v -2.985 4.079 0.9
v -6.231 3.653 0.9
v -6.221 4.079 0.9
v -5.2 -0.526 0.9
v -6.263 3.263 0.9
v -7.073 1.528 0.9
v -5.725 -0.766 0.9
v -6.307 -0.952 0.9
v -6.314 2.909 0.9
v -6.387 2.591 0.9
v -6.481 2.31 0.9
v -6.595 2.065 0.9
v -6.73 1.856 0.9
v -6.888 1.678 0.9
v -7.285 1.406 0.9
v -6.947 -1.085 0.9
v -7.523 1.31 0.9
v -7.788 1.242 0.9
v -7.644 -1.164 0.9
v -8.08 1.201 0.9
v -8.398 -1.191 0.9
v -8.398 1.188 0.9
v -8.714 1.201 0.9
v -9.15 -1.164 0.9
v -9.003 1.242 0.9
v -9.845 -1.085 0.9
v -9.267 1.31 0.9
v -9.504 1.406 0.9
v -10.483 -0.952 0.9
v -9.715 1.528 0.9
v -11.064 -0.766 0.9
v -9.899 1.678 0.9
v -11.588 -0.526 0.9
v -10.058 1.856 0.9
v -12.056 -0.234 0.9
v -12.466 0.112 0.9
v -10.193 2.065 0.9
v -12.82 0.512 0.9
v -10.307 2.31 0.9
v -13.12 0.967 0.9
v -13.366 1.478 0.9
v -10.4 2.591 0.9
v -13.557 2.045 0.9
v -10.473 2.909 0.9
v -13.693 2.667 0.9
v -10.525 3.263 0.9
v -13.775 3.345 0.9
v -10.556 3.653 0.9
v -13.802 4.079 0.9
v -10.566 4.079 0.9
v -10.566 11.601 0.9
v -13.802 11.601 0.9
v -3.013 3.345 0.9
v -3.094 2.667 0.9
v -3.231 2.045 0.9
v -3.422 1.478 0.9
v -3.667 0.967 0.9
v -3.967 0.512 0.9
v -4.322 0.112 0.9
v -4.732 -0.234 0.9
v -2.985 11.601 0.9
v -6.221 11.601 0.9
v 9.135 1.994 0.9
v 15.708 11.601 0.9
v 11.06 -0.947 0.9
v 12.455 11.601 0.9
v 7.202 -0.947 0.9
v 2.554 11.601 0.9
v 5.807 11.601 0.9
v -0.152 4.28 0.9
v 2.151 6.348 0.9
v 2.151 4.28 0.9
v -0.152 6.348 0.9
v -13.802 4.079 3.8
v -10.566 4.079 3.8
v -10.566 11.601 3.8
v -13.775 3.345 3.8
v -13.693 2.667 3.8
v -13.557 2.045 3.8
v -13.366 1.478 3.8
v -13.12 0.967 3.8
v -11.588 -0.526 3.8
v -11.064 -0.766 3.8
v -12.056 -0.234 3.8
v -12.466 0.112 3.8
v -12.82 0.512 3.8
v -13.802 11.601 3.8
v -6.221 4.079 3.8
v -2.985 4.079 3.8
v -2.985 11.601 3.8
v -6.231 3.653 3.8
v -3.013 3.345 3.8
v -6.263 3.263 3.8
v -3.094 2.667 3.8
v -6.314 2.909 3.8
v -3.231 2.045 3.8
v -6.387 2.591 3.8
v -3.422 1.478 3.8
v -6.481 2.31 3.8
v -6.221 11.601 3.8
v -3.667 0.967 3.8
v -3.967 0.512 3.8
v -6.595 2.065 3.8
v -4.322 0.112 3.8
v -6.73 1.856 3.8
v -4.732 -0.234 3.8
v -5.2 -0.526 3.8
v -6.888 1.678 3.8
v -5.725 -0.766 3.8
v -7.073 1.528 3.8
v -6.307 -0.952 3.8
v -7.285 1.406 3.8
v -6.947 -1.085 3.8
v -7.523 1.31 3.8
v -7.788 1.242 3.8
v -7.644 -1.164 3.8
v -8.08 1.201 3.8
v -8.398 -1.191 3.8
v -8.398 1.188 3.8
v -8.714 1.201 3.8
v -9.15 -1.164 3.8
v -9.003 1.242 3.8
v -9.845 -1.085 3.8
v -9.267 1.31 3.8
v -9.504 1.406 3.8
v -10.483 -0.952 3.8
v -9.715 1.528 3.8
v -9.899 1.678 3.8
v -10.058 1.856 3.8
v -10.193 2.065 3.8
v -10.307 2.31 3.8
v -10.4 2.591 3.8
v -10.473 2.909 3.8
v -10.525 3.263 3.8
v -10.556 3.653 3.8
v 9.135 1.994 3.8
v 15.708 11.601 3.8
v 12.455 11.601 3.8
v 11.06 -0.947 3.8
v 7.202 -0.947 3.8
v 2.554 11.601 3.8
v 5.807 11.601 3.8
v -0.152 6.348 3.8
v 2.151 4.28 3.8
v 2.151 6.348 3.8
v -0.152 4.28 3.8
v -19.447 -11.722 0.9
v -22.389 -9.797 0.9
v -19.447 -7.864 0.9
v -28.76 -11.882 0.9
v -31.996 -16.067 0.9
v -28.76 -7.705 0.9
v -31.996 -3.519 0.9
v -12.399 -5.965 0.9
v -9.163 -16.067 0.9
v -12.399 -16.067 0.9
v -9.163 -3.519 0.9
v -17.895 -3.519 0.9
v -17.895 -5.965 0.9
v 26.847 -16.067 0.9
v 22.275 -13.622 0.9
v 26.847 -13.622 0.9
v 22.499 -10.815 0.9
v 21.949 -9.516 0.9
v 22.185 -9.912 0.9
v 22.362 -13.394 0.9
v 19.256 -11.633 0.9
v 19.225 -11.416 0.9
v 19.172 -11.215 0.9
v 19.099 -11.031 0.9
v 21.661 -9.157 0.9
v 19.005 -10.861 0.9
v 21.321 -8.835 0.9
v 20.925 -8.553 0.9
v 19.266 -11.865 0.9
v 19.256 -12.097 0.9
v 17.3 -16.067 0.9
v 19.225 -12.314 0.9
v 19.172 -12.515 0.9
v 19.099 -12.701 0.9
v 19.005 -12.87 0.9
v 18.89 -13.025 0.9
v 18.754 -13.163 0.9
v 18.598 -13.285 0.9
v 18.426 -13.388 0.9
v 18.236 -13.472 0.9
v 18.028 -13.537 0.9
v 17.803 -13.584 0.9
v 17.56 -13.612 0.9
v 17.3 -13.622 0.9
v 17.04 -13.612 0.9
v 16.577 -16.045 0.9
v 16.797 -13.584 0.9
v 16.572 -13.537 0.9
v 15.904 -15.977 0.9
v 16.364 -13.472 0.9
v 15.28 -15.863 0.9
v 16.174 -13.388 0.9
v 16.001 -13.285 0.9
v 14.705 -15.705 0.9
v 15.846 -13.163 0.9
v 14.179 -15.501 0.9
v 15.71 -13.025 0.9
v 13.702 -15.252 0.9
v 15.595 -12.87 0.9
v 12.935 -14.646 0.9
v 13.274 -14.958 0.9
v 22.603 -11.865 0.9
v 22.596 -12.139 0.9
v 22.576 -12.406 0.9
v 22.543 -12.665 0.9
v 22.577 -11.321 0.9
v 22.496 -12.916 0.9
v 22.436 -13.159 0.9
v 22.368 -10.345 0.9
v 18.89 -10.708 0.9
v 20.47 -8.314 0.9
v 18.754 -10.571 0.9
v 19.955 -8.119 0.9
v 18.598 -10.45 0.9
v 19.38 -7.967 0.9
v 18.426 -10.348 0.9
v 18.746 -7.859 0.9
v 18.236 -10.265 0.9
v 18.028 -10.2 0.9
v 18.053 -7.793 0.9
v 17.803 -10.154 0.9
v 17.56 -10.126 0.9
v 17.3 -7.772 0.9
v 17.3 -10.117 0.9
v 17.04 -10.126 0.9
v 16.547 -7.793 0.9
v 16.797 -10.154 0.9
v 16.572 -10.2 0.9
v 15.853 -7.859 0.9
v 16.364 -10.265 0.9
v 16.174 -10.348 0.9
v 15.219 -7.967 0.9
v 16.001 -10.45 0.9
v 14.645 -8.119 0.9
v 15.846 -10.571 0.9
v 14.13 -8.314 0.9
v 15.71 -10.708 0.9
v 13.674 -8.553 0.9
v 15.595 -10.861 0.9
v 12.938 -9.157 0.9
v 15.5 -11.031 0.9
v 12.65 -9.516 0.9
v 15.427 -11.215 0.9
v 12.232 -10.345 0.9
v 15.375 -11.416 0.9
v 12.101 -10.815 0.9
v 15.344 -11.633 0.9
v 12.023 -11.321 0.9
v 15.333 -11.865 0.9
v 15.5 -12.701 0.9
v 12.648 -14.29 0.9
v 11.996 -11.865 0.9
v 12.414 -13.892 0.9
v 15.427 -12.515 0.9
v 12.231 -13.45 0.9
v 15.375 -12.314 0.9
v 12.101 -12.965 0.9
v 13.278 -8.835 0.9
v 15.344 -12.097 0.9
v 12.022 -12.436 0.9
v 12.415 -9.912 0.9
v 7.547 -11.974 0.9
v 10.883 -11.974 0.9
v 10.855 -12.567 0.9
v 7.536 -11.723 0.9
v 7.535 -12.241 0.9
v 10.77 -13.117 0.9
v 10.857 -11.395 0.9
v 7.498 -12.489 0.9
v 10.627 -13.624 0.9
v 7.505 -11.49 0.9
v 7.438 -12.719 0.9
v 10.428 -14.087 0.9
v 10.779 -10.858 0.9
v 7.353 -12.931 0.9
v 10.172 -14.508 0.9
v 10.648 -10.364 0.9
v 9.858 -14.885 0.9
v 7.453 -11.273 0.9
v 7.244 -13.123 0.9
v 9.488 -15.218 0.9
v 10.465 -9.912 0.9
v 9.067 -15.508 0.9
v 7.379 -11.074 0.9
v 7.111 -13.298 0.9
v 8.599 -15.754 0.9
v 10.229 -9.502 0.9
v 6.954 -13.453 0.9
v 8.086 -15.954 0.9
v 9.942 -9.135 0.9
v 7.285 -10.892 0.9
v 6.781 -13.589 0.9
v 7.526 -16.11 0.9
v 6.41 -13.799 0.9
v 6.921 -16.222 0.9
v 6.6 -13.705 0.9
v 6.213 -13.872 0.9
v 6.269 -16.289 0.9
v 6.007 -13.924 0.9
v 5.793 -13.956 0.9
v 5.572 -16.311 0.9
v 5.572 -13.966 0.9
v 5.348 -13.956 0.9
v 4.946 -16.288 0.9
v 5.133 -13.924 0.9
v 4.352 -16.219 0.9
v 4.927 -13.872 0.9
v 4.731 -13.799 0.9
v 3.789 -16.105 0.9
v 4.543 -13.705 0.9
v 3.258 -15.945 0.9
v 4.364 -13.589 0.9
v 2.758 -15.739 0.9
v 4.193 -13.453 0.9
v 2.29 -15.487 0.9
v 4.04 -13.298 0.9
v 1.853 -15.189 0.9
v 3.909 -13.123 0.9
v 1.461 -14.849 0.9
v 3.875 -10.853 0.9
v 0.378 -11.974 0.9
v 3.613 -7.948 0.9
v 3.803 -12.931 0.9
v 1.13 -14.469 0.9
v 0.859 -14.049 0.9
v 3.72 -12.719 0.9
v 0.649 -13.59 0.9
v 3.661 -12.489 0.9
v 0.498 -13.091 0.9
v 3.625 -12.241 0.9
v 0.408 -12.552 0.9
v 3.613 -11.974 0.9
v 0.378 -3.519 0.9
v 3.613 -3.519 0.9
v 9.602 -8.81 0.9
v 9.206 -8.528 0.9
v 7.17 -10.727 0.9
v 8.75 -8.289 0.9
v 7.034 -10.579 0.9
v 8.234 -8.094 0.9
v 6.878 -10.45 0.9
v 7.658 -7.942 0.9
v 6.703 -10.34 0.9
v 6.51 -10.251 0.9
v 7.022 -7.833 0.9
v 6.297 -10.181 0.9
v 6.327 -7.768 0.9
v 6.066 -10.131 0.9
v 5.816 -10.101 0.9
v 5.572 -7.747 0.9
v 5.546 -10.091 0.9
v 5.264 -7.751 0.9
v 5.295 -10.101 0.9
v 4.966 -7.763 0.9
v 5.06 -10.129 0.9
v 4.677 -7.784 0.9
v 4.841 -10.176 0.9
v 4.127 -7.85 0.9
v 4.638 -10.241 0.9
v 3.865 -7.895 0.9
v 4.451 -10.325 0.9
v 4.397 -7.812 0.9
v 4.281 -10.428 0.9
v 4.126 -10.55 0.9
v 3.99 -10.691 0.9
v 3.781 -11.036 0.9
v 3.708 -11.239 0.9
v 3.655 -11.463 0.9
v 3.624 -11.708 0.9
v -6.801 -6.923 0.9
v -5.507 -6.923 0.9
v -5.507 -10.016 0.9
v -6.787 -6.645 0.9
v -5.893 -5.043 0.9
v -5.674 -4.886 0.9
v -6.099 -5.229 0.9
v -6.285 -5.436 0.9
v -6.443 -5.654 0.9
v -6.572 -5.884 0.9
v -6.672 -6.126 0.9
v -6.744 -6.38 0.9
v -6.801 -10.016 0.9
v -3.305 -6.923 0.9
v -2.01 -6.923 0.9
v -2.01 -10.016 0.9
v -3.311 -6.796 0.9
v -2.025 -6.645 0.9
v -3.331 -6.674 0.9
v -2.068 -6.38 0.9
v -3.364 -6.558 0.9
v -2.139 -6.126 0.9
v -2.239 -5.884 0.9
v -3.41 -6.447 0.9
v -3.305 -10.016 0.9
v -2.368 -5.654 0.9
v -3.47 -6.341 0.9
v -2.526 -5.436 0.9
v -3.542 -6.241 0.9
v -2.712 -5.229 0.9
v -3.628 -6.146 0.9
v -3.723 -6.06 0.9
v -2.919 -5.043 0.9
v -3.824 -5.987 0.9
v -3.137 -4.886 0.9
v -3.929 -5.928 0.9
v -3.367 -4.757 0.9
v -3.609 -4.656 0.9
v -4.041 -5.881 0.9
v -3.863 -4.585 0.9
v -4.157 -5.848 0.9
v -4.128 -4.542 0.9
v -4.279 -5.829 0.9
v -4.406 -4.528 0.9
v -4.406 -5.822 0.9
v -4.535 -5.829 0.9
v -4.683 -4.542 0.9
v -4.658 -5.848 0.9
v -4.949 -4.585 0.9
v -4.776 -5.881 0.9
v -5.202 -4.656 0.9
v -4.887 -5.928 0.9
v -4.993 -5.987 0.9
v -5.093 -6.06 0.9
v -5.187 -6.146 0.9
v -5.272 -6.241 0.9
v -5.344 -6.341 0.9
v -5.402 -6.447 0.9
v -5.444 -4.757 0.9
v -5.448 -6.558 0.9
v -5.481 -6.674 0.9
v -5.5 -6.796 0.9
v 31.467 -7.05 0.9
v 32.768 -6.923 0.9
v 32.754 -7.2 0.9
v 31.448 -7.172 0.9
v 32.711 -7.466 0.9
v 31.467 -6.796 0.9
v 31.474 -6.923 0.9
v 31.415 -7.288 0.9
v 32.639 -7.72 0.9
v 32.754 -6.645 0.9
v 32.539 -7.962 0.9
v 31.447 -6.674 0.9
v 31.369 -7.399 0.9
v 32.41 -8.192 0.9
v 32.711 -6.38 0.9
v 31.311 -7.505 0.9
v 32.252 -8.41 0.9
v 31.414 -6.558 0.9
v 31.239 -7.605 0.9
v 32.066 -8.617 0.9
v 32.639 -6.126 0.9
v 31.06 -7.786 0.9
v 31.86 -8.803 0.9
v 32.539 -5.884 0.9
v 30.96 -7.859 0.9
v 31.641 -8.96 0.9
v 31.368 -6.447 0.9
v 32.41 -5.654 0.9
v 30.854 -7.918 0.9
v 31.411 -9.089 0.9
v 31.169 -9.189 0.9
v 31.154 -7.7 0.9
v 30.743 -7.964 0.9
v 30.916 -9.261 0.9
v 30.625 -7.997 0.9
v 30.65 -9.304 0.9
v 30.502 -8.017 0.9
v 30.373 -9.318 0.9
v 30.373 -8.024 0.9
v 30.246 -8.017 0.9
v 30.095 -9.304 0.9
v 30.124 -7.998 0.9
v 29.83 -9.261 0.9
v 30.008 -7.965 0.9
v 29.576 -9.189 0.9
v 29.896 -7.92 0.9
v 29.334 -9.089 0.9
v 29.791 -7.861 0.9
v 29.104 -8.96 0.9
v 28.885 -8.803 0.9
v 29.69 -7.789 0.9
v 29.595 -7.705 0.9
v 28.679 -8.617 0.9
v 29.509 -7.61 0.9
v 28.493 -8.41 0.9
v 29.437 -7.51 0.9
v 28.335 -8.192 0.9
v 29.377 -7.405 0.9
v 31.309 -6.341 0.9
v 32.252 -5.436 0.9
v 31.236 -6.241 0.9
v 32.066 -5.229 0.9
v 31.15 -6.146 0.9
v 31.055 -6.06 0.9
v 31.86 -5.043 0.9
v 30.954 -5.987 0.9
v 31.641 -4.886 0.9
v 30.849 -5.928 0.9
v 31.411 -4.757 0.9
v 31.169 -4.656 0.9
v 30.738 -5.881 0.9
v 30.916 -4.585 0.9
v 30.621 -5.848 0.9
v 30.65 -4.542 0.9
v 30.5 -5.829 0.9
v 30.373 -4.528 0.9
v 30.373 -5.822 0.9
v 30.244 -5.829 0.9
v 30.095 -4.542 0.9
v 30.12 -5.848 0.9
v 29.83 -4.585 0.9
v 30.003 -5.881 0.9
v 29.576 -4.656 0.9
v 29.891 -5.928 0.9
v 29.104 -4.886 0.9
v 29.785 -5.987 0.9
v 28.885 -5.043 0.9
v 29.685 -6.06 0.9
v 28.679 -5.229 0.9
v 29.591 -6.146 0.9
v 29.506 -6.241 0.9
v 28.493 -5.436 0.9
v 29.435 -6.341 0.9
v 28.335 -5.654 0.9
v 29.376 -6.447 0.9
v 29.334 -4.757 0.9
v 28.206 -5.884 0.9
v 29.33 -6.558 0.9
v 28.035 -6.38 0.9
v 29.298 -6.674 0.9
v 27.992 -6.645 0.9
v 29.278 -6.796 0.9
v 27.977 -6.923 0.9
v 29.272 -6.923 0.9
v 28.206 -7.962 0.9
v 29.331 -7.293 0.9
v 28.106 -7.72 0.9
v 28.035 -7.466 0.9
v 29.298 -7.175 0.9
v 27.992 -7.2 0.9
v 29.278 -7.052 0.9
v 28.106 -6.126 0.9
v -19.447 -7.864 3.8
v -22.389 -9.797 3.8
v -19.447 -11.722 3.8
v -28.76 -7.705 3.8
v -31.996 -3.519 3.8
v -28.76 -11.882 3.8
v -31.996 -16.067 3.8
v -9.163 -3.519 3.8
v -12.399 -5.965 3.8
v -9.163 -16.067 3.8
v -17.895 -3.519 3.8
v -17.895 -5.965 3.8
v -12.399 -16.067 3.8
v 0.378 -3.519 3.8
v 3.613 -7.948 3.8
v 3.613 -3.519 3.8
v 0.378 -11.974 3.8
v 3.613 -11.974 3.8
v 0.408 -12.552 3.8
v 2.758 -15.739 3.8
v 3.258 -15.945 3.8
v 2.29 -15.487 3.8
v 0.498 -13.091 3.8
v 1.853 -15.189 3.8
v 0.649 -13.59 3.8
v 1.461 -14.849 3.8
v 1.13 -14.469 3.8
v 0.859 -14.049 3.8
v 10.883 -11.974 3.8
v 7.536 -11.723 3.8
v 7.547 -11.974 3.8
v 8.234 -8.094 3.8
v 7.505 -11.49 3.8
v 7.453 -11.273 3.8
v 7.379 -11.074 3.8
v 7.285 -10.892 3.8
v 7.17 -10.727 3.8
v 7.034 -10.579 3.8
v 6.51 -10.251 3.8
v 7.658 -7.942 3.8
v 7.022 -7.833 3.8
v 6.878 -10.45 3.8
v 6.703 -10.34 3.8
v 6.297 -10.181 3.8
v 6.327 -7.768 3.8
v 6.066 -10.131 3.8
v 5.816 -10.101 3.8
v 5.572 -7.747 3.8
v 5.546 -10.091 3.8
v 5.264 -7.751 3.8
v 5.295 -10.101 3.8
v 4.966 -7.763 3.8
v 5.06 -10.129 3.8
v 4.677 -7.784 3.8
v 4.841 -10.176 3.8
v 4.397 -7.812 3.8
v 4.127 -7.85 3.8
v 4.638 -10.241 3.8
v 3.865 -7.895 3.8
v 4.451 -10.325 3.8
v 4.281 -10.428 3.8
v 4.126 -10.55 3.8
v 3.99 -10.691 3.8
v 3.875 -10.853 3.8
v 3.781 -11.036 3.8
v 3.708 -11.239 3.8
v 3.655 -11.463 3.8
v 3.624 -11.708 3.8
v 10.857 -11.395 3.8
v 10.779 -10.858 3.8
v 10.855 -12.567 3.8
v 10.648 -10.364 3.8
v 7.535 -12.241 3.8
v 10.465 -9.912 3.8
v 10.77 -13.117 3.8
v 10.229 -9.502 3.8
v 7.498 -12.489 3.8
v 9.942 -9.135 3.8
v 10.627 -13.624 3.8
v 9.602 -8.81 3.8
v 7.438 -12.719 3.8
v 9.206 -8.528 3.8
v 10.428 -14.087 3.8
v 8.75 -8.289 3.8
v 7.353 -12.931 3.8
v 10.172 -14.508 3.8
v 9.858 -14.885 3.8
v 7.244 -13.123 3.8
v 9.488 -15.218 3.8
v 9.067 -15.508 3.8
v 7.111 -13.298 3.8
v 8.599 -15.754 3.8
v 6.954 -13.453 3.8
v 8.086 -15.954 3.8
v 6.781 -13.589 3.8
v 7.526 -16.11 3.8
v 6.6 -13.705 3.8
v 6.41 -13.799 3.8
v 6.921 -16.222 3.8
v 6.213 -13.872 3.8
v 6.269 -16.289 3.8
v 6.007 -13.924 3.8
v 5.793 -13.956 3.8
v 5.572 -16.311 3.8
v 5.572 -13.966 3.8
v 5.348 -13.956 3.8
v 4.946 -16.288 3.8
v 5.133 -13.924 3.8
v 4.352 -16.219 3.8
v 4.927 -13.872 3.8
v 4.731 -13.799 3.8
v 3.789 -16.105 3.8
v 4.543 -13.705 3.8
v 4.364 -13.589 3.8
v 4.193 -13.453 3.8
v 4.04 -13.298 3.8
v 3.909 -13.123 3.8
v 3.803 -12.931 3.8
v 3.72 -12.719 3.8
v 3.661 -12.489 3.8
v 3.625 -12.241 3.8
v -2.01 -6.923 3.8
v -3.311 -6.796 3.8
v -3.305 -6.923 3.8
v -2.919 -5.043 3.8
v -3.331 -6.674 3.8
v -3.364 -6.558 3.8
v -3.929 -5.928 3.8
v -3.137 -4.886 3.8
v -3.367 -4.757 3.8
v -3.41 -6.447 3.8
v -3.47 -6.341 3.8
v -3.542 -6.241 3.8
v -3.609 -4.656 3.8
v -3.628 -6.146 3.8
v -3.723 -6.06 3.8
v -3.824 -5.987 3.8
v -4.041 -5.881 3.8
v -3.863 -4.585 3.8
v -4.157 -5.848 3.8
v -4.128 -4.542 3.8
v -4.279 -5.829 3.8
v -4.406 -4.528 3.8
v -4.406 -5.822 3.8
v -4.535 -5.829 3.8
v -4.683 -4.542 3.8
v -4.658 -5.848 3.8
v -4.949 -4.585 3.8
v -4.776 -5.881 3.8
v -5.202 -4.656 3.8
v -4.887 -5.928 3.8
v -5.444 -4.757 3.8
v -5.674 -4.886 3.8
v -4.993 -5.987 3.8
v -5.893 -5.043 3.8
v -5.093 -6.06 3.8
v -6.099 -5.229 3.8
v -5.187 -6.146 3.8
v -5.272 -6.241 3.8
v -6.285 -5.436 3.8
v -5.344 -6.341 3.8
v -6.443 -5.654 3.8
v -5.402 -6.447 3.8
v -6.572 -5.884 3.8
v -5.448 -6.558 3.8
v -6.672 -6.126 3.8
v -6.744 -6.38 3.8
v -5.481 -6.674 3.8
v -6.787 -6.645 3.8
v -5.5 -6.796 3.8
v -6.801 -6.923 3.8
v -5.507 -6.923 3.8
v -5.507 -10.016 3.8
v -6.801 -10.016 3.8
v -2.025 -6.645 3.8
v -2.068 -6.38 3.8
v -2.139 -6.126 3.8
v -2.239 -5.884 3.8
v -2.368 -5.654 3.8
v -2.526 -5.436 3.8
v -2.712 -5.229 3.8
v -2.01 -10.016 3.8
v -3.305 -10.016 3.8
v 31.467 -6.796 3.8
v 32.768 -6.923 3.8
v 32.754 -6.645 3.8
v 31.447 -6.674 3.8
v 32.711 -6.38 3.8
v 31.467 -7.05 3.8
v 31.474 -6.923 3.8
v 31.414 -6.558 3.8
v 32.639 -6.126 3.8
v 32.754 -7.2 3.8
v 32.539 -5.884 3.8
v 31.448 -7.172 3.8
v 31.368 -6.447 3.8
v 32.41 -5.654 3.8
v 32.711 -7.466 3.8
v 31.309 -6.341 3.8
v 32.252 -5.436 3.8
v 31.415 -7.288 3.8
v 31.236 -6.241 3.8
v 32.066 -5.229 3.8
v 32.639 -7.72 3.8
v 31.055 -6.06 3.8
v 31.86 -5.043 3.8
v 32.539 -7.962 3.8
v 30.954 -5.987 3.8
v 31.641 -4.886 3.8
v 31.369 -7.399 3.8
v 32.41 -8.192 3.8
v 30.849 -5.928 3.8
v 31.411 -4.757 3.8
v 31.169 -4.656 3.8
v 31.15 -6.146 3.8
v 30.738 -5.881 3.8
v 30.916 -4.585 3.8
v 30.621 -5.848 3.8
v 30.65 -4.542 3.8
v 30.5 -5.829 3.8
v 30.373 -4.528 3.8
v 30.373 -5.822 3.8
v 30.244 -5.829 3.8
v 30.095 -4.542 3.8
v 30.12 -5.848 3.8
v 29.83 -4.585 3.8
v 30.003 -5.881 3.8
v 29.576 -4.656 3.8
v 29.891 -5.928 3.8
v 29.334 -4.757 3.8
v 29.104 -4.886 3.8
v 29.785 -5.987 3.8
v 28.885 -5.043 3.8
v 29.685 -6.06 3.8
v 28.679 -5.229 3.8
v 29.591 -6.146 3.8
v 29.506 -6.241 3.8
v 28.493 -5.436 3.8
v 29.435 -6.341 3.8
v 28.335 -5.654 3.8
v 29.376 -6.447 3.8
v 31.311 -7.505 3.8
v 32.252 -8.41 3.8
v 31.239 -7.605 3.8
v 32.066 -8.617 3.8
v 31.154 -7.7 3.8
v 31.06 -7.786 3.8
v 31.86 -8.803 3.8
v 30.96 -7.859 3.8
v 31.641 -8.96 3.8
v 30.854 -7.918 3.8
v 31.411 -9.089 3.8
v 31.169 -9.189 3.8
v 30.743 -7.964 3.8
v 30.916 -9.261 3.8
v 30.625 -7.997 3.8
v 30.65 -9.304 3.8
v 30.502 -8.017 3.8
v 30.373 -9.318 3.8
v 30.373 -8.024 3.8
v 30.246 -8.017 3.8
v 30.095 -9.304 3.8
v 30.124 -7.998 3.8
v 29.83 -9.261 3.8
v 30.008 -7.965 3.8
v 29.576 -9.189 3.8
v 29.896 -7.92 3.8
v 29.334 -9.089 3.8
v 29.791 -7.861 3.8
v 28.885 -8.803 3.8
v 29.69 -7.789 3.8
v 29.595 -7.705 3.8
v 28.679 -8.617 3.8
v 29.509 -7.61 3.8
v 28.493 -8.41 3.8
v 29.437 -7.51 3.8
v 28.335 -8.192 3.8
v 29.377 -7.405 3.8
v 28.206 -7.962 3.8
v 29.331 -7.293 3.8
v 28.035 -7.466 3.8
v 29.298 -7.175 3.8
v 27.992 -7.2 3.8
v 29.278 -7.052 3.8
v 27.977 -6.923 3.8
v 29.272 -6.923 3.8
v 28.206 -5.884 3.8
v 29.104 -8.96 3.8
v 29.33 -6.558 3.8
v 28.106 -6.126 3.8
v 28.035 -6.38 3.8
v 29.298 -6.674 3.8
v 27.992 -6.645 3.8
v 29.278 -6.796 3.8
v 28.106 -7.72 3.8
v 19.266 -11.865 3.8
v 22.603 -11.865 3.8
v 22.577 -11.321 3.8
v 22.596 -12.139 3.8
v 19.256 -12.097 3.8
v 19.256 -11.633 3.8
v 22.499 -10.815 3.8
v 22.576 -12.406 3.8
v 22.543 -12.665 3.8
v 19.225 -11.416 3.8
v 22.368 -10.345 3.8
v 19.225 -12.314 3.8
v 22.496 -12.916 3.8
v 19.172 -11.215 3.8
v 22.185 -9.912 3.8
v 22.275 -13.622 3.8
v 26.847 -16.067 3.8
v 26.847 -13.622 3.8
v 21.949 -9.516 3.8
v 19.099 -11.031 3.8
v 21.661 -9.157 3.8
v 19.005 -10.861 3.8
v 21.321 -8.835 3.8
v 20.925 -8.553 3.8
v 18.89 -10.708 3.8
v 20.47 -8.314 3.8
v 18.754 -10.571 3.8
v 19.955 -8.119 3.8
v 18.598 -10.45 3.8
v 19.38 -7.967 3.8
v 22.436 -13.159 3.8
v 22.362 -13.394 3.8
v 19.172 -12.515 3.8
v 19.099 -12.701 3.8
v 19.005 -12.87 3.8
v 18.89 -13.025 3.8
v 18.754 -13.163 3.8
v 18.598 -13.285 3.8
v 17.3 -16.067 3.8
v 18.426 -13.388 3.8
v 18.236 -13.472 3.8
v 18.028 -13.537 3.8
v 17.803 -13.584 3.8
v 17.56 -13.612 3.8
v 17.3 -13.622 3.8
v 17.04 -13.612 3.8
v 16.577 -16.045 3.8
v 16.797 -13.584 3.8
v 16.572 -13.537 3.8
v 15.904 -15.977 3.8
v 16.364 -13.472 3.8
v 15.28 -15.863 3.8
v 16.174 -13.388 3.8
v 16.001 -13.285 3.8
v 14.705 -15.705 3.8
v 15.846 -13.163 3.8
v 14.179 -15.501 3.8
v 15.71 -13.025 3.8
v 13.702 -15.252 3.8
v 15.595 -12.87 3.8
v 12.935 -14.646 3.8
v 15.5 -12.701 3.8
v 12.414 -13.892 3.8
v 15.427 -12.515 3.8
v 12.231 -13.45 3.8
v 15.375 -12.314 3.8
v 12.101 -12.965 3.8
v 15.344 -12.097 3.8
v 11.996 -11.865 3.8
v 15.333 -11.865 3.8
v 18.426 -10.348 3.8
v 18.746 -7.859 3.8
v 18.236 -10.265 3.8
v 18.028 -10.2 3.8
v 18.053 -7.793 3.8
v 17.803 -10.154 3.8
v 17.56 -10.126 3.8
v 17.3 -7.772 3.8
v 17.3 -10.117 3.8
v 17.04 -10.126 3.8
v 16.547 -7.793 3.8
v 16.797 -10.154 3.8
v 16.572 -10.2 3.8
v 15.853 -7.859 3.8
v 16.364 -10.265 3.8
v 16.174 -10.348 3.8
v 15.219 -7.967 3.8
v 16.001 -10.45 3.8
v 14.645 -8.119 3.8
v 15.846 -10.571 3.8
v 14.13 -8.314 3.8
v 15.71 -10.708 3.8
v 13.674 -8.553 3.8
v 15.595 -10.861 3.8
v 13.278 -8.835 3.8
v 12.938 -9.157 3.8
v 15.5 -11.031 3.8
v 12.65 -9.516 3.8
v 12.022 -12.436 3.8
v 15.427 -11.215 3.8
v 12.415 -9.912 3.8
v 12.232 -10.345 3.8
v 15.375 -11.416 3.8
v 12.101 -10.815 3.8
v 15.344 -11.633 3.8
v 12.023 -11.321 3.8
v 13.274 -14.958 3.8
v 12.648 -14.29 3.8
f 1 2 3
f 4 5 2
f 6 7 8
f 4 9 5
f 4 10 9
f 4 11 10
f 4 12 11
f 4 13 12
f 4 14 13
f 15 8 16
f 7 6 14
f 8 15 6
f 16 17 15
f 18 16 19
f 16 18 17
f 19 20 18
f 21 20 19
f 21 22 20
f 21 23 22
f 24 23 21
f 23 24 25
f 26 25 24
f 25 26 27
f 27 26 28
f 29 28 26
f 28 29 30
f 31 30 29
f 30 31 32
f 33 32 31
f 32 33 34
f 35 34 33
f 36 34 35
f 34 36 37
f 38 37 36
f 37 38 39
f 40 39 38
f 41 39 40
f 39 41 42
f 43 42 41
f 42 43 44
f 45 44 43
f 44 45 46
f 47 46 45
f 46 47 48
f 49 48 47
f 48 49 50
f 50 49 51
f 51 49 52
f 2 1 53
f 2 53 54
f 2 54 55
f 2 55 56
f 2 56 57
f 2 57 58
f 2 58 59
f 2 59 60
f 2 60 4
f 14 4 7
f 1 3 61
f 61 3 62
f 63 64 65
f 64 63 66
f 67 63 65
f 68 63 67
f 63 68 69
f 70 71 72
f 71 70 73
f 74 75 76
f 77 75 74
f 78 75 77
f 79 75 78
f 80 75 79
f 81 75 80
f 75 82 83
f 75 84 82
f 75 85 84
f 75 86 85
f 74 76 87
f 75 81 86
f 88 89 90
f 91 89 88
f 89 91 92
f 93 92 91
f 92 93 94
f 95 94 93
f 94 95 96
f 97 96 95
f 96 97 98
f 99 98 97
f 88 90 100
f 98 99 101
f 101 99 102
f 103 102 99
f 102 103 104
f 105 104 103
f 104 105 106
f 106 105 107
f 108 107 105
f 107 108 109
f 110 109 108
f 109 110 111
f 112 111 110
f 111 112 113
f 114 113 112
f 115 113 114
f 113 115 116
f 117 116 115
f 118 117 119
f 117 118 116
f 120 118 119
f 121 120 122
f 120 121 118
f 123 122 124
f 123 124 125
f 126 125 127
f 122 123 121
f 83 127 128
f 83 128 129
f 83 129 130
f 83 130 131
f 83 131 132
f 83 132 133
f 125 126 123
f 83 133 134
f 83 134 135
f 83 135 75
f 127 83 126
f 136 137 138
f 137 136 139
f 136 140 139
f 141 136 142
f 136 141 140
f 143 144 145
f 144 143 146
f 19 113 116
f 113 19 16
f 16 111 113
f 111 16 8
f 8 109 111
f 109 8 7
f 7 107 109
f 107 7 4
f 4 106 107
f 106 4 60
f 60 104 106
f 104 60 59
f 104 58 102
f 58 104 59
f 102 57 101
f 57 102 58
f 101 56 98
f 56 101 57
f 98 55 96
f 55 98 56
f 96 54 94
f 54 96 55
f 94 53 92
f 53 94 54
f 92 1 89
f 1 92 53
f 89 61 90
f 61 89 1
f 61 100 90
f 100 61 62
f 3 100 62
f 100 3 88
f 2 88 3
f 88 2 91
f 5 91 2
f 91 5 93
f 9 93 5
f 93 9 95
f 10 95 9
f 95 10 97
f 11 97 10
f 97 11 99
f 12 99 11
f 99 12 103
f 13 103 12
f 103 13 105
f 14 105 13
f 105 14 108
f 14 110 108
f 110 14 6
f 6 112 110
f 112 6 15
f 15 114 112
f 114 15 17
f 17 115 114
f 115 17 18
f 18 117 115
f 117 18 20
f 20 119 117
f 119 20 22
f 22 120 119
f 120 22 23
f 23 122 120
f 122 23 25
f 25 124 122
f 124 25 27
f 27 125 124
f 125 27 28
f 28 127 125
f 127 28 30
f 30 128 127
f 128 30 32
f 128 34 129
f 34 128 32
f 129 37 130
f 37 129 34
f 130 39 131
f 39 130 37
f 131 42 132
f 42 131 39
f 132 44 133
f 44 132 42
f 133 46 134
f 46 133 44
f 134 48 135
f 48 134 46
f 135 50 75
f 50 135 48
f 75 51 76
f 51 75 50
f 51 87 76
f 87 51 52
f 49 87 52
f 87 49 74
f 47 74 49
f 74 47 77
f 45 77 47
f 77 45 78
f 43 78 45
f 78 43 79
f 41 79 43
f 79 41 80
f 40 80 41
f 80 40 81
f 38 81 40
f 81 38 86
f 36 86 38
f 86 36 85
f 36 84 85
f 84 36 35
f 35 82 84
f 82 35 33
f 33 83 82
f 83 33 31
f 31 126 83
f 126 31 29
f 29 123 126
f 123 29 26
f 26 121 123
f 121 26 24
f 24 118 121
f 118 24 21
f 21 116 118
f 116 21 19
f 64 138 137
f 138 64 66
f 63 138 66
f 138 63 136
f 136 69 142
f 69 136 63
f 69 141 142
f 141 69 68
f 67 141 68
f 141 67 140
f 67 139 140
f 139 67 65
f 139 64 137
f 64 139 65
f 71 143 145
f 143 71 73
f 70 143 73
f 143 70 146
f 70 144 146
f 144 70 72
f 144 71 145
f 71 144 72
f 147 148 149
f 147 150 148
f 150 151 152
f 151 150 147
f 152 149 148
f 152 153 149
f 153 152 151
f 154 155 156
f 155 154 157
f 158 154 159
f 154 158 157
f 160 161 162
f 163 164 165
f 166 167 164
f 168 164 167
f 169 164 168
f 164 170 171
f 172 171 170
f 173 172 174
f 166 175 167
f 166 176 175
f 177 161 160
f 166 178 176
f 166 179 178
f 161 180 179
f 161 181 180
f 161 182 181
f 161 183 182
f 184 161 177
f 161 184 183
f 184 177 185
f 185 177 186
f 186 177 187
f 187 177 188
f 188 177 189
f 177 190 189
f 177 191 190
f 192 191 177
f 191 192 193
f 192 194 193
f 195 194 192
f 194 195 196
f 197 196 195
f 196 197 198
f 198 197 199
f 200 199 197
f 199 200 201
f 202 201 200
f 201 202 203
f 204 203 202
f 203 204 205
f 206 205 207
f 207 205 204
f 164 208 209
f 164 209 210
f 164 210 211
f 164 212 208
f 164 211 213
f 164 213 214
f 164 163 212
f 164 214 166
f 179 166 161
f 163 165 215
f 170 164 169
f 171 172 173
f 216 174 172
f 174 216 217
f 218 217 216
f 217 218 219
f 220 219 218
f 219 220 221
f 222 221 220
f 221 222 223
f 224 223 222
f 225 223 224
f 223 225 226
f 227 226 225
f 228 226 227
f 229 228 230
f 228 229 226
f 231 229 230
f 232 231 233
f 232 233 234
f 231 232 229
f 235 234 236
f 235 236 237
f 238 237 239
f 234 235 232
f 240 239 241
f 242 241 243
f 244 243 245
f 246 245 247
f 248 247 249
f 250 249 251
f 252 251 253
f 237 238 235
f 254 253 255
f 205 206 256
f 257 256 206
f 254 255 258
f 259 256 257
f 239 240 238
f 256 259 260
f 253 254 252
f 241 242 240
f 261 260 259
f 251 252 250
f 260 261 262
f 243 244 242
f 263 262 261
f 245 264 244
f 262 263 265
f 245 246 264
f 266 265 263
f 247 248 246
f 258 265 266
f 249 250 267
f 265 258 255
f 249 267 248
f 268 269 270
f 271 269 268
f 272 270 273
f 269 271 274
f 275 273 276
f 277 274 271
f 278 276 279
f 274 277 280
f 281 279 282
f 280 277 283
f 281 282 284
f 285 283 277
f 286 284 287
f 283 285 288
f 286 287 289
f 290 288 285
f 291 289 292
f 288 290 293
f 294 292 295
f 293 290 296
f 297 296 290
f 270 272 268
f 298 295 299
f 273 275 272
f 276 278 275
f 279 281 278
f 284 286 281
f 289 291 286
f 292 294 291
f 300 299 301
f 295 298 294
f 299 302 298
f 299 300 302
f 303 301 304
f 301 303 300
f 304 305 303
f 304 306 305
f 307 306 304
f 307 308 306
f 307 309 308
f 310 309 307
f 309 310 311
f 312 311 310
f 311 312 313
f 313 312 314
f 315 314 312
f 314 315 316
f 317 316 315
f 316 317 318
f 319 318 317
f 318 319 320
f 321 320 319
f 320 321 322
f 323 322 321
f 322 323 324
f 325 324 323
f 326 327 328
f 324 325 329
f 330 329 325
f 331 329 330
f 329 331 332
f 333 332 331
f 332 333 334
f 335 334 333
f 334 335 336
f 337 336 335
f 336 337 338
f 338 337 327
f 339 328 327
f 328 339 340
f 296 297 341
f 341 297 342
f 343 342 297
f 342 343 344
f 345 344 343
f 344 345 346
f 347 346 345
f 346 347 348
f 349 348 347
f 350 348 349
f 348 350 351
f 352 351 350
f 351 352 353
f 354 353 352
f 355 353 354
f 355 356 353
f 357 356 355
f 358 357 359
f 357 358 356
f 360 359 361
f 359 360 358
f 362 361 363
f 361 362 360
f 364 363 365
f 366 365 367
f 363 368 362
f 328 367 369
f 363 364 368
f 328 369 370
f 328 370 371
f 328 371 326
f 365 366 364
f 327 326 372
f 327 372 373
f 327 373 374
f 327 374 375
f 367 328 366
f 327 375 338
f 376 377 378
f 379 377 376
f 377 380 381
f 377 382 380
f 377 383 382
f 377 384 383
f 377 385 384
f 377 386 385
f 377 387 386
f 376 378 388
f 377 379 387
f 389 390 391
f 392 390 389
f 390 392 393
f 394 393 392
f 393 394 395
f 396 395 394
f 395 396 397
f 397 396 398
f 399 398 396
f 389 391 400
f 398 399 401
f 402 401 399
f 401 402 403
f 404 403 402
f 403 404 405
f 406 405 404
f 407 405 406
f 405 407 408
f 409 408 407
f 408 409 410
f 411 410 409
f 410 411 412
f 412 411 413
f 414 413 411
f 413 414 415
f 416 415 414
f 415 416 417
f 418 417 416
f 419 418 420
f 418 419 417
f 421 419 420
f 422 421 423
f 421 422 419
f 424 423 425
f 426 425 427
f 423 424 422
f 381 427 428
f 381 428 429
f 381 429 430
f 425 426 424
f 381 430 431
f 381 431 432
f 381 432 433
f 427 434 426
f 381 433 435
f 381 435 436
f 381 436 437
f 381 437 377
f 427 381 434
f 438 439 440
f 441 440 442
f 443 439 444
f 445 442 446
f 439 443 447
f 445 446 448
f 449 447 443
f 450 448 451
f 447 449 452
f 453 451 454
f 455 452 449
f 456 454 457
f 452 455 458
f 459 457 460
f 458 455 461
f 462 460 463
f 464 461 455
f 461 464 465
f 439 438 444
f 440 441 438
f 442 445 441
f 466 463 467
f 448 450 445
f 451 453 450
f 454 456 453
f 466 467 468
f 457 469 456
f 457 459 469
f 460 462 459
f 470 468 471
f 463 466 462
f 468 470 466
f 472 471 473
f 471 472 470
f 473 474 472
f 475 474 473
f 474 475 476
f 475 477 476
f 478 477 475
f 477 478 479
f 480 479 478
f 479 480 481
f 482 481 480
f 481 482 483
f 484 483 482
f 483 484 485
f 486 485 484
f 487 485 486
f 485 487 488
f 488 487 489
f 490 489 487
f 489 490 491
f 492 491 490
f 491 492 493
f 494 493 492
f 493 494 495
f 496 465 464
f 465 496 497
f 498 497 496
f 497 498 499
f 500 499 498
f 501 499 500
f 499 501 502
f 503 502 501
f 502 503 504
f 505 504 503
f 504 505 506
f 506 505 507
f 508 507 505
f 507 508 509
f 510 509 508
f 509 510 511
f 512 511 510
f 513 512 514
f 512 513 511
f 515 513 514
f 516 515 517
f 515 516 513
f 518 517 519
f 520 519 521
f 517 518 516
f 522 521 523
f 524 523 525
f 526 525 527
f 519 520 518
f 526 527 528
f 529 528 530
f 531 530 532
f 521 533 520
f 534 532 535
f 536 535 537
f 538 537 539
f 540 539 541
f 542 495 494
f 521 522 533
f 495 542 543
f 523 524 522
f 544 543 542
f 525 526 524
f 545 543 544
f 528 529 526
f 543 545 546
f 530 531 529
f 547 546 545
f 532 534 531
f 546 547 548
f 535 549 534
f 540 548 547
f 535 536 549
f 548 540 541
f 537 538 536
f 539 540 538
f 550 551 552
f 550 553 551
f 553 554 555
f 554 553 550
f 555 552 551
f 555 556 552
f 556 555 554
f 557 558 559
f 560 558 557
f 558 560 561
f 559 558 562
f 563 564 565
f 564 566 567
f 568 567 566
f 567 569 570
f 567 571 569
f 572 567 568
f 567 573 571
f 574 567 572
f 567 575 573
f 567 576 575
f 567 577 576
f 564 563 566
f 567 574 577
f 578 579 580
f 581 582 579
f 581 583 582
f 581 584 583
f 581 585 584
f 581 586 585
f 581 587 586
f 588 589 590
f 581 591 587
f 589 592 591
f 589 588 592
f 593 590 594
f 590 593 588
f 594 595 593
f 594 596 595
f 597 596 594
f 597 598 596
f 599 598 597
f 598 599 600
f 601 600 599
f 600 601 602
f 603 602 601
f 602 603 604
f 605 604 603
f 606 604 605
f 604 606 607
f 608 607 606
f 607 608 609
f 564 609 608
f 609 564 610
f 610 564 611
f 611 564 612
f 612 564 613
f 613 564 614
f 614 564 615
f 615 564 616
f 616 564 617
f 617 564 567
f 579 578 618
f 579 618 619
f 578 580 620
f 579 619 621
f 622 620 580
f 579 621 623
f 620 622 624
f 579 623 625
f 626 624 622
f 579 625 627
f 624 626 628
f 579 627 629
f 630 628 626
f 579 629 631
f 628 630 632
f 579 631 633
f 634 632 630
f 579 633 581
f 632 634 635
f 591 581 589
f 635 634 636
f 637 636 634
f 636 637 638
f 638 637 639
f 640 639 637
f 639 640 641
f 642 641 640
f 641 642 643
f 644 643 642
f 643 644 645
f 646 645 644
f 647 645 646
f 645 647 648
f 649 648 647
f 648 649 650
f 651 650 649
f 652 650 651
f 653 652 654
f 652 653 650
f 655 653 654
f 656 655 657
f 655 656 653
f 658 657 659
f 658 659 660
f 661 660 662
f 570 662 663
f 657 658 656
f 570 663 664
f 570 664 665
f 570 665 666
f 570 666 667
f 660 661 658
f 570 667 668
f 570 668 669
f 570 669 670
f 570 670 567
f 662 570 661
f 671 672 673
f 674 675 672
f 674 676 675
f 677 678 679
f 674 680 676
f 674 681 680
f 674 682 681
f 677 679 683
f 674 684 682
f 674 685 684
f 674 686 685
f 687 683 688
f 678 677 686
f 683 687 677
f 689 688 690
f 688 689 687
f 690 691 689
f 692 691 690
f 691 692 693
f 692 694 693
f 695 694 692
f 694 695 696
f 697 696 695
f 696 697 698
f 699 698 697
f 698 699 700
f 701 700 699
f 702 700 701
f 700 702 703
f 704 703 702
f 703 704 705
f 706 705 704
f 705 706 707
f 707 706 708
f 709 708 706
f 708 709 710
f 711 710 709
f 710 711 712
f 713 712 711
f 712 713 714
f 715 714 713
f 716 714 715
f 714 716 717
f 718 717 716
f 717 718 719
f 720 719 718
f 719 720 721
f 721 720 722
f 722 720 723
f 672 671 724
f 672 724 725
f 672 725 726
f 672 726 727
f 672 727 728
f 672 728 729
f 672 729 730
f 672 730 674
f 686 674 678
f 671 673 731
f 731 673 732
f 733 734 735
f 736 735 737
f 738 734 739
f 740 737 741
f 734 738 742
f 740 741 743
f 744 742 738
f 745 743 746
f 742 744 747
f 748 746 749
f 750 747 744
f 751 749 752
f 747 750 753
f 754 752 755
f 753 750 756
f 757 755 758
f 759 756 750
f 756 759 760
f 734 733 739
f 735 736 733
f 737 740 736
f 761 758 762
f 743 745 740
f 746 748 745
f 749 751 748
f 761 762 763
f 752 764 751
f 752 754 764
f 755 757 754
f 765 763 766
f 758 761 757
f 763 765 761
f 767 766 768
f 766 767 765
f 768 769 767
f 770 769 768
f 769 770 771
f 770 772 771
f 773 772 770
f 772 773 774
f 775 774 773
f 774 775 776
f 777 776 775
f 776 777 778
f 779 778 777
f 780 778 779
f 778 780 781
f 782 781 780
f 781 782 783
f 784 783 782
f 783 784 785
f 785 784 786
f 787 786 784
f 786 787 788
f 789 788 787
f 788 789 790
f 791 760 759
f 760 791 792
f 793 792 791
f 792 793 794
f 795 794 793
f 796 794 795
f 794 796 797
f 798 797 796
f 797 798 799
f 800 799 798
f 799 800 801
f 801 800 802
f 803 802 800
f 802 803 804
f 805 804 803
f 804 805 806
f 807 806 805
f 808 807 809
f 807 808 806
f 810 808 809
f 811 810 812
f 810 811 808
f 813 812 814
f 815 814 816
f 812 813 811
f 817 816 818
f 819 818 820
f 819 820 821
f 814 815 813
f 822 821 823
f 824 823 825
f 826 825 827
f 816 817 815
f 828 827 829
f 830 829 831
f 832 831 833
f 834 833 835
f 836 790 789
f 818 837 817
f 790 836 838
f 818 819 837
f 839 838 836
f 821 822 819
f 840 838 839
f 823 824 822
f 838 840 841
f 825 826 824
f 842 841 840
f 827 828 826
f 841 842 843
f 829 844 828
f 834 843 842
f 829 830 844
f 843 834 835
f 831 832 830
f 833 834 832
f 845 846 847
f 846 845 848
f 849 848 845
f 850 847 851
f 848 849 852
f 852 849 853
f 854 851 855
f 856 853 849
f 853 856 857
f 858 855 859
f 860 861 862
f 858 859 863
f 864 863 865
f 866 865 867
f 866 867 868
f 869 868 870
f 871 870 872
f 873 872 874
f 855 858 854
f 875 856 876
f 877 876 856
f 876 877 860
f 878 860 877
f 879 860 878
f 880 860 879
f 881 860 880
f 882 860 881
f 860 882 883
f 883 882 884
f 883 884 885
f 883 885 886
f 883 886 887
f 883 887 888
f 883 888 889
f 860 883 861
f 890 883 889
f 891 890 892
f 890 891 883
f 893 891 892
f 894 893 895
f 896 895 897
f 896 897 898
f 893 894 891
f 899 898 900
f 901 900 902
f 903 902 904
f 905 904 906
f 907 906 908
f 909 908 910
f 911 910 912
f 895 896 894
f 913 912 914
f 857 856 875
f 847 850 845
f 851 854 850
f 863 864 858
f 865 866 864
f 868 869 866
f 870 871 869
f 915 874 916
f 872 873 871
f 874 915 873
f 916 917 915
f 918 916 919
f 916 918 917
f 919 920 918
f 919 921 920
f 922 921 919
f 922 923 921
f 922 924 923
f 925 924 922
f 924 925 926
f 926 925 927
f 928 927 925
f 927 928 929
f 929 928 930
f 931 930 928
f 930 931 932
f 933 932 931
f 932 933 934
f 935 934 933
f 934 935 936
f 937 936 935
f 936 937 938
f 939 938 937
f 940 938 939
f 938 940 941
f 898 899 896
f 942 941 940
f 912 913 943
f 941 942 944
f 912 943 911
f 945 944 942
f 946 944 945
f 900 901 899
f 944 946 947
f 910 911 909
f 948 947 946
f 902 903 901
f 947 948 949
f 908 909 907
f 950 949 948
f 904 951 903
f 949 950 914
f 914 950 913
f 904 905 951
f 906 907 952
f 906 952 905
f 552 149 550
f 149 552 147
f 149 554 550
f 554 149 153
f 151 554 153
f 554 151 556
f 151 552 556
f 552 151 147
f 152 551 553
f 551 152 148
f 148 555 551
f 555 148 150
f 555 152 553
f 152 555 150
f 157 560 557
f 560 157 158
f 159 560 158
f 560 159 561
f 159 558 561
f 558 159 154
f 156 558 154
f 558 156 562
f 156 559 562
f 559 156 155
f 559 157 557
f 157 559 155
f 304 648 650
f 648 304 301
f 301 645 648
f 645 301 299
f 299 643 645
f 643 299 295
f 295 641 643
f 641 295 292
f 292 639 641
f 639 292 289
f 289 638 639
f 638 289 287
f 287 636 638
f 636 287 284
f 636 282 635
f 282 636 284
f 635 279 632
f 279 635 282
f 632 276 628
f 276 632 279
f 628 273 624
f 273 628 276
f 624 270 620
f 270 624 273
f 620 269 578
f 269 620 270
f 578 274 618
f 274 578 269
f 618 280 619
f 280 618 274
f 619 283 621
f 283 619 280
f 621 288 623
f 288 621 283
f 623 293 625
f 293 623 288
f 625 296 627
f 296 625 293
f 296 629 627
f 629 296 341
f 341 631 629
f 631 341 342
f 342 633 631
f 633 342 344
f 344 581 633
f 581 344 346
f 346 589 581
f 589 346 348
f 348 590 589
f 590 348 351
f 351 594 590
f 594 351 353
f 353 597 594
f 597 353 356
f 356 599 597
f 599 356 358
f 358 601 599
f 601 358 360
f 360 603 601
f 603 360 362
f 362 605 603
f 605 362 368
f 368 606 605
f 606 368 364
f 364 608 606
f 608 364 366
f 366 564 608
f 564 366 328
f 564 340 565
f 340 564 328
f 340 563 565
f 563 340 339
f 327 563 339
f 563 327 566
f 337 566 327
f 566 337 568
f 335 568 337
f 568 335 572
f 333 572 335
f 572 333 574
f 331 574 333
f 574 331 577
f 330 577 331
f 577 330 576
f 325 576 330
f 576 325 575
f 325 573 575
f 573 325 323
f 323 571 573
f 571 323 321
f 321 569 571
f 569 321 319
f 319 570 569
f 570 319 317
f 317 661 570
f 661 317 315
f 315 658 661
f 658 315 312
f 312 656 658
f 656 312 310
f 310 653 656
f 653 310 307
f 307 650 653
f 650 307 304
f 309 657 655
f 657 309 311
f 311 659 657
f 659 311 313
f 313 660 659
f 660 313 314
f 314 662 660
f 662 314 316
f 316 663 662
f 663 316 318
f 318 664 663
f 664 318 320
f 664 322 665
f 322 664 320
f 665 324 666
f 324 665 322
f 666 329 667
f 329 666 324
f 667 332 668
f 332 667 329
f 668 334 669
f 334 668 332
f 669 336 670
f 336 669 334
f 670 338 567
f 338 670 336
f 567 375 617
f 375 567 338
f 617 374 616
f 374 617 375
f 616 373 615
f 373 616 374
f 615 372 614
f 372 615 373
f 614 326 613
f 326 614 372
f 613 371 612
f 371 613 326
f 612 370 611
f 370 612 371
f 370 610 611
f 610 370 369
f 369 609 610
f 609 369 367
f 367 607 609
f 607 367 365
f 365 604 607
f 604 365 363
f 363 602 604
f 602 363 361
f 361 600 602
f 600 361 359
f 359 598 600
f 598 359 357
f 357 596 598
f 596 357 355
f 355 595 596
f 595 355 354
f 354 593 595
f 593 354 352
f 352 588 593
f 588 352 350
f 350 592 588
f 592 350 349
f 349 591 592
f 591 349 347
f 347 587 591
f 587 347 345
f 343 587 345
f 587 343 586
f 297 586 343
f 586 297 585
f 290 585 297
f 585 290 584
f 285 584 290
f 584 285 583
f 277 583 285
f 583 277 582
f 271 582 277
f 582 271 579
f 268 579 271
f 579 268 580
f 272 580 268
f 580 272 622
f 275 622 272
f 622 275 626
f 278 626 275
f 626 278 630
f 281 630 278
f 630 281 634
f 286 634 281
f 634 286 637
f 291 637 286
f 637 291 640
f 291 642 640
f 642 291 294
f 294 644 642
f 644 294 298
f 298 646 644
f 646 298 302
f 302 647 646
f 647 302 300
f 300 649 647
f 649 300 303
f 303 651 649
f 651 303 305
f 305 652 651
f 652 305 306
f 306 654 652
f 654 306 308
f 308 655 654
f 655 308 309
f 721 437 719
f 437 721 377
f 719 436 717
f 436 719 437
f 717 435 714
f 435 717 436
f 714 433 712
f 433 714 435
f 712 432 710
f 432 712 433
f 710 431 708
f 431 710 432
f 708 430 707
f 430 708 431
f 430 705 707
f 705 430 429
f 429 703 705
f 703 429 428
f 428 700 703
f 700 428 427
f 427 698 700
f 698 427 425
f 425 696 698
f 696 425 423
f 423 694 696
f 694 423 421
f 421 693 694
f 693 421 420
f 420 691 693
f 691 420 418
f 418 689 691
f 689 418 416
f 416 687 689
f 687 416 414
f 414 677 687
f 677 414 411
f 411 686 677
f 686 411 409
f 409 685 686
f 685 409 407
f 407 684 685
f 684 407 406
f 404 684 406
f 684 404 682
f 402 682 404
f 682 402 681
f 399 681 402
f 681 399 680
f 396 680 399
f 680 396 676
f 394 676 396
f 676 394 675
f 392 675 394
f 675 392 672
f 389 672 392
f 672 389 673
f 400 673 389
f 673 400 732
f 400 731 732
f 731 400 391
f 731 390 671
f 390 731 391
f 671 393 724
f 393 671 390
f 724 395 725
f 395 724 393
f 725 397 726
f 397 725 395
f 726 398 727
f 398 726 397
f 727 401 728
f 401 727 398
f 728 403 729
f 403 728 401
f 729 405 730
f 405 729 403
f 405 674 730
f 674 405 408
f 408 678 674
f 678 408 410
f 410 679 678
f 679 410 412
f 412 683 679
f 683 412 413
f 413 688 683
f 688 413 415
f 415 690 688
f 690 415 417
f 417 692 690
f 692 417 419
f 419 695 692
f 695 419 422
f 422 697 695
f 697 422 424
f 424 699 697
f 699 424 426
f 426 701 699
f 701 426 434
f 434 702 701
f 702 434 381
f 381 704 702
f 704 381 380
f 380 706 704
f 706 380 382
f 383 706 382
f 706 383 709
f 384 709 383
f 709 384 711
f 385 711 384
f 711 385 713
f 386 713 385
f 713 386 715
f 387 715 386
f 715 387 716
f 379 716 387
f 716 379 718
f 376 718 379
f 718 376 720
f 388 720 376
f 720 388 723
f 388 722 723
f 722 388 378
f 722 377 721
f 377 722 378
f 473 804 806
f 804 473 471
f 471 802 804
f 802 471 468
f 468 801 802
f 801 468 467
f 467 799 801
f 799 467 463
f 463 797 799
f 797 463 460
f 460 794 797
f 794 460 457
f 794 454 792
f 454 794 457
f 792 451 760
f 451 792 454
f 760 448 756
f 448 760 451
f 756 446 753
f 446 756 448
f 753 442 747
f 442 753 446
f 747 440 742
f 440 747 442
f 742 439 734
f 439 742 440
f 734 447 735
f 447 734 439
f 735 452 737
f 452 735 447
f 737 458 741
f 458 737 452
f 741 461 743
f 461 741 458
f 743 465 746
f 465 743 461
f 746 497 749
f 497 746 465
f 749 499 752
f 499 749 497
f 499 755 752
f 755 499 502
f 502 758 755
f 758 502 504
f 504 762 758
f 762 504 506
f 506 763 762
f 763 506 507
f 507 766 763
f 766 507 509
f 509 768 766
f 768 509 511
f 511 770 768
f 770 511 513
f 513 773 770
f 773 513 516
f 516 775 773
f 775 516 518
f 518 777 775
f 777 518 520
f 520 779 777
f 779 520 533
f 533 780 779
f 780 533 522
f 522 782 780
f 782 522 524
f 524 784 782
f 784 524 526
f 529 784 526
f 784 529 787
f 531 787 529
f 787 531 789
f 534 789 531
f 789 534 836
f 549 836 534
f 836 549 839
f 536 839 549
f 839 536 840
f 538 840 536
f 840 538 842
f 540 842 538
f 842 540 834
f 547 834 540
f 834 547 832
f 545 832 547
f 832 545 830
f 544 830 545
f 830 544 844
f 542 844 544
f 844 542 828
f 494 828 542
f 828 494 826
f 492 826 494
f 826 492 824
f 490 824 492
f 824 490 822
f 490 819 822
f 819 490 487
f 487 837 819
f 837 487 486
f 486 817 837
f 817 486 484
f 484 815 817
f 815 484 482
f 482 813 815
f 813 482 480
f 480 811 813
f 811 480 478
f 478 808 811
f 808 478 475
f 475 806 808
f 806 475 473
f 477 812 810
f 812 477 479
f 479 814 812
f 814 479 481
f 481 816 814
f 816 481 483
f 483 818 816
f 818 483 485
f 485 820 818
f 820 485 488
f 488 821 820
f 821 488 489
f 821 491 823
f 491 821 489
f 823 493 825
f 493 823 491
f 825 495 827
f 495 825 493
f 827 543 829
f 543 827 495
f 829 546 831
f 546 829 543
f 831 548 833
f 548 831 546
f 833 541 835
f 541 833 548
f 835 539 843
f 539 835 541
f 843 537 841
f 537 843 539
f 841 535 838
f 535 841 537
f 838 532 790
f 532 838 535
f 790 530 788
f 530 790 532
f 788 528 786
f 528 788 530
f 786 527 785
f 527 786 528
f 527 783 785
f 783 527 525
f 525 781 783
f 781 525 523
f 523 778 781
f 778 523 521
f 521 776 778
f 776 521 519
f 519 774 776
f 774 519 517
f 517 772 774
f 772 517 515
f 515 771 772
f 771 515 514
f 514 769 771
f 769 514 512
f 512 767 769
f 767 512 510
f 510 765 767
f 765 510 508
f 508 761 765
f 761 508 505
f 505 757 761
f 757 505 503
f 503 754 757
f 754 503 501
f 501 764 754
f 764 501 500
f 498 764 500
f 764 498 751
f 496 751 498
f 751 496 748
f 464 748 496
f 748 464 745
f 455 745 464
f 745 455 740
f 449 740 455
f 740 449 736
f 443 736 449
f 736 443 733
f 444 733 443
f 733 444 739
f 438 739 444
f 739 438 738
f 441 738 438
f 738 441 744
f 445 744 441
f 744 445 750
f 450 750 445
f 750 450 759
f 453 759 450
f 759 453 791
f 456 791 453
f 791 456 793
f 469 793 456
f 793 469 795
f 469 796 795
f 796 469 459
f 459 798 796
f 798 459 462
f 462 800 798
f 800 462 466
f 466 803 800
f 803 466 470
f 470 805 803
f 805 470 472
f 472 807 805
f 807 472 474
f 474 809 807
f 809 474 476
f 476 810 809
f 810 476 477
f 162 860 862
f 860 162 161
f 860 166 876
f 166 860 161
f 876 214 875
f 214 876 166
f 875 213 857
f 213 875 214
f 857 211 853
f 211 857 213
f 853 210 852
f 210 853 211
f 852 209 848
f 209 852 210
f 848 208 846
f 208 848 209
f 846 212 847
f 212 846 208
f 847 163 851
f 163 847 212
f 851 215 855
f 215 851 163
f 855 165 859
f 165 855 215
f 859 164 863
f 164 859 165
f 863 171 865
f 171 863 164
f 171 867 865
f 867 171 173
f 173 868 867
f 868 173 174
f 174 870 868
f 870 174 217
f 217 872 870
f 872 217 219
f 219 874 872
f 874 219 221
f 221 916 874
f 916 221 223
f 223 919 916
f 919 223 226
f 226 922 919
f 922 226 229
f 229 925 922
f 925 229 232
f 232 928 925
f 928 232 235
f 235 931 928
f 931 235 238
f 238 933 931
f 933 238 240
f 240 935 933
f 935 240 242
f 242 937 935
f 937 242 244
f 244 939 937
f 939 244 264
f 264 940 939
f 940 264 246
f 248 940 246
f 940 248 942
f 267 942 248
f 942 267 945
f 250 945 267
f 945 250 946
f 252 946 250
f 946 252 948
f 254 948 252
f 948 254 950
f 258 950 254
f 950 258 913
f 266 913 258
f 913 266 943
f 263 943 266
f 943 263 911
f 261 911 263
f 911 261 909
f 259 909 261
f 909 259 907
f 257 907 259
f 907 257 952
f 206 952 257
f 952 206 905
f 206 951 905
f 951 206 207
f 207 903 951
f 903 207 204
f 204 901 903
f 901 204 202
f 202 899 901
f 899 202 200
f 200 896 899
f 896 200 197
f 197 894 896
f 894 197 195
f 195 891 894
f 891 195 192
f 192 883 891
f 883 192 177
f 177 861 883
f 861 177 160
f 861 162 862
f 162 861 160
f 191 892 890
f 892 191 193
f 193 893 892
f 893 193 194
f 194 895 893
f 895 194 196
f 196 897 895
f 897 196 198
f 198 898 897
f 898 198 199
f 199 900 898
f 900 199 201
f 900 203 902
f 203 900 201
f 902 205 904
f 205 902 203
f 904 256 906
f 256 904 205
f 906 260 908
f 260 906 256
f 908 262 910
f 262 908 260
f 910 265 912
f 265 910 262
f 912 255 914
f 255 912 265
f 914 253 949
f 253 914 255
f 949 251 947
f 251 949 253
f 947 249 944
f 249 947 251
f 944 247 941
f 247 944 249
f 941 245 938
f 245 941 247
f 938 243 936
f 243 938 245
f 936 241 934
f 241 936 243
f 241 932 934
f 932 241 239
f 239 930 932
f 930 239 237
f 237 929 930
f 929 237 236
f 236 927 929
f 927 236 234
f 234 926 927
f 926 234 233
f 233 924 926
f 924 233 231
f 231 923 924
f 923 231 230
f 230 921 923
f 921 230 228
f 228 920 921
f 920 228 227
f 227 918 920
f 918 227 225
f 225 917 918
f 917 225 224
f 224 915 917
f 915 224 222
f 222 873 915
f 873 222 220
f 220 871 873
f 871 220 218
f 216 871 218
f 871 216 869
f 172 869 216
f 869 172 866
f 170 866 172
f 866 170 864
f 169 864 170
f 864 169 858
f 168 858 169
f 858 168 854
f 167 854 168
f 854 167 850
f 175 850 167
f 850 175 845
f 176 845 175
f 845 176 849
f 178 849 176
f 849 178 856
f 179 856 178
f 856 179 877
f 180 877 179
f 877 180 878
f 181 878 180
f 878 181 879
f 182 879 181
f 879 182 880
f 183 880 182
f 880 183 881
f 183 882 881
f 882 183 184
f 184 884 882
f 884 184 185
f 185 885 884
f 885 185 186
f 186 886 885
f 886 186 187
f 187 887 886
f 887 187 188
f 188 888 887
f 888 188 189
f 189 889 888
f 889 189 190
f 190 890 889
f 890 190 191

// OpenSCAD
$fn = 48;
  // syllabics (overlaid on icon, tallest)
  translate([0, 5.060, 0.900]) linear_extrude(height=2.900) text("ᑌᐺ", size=12.394, halign="center", valign="center", font="Euphemia UCAS:style=Bold");
  translate([0, -10.060, 0.900]) linear_extrude(height=2.900) text("ᐅᒣᐢᑲᓇᐤ", size=12.394, halign="center", valign="center", font="Euphemia UCAS:style=Bold");
